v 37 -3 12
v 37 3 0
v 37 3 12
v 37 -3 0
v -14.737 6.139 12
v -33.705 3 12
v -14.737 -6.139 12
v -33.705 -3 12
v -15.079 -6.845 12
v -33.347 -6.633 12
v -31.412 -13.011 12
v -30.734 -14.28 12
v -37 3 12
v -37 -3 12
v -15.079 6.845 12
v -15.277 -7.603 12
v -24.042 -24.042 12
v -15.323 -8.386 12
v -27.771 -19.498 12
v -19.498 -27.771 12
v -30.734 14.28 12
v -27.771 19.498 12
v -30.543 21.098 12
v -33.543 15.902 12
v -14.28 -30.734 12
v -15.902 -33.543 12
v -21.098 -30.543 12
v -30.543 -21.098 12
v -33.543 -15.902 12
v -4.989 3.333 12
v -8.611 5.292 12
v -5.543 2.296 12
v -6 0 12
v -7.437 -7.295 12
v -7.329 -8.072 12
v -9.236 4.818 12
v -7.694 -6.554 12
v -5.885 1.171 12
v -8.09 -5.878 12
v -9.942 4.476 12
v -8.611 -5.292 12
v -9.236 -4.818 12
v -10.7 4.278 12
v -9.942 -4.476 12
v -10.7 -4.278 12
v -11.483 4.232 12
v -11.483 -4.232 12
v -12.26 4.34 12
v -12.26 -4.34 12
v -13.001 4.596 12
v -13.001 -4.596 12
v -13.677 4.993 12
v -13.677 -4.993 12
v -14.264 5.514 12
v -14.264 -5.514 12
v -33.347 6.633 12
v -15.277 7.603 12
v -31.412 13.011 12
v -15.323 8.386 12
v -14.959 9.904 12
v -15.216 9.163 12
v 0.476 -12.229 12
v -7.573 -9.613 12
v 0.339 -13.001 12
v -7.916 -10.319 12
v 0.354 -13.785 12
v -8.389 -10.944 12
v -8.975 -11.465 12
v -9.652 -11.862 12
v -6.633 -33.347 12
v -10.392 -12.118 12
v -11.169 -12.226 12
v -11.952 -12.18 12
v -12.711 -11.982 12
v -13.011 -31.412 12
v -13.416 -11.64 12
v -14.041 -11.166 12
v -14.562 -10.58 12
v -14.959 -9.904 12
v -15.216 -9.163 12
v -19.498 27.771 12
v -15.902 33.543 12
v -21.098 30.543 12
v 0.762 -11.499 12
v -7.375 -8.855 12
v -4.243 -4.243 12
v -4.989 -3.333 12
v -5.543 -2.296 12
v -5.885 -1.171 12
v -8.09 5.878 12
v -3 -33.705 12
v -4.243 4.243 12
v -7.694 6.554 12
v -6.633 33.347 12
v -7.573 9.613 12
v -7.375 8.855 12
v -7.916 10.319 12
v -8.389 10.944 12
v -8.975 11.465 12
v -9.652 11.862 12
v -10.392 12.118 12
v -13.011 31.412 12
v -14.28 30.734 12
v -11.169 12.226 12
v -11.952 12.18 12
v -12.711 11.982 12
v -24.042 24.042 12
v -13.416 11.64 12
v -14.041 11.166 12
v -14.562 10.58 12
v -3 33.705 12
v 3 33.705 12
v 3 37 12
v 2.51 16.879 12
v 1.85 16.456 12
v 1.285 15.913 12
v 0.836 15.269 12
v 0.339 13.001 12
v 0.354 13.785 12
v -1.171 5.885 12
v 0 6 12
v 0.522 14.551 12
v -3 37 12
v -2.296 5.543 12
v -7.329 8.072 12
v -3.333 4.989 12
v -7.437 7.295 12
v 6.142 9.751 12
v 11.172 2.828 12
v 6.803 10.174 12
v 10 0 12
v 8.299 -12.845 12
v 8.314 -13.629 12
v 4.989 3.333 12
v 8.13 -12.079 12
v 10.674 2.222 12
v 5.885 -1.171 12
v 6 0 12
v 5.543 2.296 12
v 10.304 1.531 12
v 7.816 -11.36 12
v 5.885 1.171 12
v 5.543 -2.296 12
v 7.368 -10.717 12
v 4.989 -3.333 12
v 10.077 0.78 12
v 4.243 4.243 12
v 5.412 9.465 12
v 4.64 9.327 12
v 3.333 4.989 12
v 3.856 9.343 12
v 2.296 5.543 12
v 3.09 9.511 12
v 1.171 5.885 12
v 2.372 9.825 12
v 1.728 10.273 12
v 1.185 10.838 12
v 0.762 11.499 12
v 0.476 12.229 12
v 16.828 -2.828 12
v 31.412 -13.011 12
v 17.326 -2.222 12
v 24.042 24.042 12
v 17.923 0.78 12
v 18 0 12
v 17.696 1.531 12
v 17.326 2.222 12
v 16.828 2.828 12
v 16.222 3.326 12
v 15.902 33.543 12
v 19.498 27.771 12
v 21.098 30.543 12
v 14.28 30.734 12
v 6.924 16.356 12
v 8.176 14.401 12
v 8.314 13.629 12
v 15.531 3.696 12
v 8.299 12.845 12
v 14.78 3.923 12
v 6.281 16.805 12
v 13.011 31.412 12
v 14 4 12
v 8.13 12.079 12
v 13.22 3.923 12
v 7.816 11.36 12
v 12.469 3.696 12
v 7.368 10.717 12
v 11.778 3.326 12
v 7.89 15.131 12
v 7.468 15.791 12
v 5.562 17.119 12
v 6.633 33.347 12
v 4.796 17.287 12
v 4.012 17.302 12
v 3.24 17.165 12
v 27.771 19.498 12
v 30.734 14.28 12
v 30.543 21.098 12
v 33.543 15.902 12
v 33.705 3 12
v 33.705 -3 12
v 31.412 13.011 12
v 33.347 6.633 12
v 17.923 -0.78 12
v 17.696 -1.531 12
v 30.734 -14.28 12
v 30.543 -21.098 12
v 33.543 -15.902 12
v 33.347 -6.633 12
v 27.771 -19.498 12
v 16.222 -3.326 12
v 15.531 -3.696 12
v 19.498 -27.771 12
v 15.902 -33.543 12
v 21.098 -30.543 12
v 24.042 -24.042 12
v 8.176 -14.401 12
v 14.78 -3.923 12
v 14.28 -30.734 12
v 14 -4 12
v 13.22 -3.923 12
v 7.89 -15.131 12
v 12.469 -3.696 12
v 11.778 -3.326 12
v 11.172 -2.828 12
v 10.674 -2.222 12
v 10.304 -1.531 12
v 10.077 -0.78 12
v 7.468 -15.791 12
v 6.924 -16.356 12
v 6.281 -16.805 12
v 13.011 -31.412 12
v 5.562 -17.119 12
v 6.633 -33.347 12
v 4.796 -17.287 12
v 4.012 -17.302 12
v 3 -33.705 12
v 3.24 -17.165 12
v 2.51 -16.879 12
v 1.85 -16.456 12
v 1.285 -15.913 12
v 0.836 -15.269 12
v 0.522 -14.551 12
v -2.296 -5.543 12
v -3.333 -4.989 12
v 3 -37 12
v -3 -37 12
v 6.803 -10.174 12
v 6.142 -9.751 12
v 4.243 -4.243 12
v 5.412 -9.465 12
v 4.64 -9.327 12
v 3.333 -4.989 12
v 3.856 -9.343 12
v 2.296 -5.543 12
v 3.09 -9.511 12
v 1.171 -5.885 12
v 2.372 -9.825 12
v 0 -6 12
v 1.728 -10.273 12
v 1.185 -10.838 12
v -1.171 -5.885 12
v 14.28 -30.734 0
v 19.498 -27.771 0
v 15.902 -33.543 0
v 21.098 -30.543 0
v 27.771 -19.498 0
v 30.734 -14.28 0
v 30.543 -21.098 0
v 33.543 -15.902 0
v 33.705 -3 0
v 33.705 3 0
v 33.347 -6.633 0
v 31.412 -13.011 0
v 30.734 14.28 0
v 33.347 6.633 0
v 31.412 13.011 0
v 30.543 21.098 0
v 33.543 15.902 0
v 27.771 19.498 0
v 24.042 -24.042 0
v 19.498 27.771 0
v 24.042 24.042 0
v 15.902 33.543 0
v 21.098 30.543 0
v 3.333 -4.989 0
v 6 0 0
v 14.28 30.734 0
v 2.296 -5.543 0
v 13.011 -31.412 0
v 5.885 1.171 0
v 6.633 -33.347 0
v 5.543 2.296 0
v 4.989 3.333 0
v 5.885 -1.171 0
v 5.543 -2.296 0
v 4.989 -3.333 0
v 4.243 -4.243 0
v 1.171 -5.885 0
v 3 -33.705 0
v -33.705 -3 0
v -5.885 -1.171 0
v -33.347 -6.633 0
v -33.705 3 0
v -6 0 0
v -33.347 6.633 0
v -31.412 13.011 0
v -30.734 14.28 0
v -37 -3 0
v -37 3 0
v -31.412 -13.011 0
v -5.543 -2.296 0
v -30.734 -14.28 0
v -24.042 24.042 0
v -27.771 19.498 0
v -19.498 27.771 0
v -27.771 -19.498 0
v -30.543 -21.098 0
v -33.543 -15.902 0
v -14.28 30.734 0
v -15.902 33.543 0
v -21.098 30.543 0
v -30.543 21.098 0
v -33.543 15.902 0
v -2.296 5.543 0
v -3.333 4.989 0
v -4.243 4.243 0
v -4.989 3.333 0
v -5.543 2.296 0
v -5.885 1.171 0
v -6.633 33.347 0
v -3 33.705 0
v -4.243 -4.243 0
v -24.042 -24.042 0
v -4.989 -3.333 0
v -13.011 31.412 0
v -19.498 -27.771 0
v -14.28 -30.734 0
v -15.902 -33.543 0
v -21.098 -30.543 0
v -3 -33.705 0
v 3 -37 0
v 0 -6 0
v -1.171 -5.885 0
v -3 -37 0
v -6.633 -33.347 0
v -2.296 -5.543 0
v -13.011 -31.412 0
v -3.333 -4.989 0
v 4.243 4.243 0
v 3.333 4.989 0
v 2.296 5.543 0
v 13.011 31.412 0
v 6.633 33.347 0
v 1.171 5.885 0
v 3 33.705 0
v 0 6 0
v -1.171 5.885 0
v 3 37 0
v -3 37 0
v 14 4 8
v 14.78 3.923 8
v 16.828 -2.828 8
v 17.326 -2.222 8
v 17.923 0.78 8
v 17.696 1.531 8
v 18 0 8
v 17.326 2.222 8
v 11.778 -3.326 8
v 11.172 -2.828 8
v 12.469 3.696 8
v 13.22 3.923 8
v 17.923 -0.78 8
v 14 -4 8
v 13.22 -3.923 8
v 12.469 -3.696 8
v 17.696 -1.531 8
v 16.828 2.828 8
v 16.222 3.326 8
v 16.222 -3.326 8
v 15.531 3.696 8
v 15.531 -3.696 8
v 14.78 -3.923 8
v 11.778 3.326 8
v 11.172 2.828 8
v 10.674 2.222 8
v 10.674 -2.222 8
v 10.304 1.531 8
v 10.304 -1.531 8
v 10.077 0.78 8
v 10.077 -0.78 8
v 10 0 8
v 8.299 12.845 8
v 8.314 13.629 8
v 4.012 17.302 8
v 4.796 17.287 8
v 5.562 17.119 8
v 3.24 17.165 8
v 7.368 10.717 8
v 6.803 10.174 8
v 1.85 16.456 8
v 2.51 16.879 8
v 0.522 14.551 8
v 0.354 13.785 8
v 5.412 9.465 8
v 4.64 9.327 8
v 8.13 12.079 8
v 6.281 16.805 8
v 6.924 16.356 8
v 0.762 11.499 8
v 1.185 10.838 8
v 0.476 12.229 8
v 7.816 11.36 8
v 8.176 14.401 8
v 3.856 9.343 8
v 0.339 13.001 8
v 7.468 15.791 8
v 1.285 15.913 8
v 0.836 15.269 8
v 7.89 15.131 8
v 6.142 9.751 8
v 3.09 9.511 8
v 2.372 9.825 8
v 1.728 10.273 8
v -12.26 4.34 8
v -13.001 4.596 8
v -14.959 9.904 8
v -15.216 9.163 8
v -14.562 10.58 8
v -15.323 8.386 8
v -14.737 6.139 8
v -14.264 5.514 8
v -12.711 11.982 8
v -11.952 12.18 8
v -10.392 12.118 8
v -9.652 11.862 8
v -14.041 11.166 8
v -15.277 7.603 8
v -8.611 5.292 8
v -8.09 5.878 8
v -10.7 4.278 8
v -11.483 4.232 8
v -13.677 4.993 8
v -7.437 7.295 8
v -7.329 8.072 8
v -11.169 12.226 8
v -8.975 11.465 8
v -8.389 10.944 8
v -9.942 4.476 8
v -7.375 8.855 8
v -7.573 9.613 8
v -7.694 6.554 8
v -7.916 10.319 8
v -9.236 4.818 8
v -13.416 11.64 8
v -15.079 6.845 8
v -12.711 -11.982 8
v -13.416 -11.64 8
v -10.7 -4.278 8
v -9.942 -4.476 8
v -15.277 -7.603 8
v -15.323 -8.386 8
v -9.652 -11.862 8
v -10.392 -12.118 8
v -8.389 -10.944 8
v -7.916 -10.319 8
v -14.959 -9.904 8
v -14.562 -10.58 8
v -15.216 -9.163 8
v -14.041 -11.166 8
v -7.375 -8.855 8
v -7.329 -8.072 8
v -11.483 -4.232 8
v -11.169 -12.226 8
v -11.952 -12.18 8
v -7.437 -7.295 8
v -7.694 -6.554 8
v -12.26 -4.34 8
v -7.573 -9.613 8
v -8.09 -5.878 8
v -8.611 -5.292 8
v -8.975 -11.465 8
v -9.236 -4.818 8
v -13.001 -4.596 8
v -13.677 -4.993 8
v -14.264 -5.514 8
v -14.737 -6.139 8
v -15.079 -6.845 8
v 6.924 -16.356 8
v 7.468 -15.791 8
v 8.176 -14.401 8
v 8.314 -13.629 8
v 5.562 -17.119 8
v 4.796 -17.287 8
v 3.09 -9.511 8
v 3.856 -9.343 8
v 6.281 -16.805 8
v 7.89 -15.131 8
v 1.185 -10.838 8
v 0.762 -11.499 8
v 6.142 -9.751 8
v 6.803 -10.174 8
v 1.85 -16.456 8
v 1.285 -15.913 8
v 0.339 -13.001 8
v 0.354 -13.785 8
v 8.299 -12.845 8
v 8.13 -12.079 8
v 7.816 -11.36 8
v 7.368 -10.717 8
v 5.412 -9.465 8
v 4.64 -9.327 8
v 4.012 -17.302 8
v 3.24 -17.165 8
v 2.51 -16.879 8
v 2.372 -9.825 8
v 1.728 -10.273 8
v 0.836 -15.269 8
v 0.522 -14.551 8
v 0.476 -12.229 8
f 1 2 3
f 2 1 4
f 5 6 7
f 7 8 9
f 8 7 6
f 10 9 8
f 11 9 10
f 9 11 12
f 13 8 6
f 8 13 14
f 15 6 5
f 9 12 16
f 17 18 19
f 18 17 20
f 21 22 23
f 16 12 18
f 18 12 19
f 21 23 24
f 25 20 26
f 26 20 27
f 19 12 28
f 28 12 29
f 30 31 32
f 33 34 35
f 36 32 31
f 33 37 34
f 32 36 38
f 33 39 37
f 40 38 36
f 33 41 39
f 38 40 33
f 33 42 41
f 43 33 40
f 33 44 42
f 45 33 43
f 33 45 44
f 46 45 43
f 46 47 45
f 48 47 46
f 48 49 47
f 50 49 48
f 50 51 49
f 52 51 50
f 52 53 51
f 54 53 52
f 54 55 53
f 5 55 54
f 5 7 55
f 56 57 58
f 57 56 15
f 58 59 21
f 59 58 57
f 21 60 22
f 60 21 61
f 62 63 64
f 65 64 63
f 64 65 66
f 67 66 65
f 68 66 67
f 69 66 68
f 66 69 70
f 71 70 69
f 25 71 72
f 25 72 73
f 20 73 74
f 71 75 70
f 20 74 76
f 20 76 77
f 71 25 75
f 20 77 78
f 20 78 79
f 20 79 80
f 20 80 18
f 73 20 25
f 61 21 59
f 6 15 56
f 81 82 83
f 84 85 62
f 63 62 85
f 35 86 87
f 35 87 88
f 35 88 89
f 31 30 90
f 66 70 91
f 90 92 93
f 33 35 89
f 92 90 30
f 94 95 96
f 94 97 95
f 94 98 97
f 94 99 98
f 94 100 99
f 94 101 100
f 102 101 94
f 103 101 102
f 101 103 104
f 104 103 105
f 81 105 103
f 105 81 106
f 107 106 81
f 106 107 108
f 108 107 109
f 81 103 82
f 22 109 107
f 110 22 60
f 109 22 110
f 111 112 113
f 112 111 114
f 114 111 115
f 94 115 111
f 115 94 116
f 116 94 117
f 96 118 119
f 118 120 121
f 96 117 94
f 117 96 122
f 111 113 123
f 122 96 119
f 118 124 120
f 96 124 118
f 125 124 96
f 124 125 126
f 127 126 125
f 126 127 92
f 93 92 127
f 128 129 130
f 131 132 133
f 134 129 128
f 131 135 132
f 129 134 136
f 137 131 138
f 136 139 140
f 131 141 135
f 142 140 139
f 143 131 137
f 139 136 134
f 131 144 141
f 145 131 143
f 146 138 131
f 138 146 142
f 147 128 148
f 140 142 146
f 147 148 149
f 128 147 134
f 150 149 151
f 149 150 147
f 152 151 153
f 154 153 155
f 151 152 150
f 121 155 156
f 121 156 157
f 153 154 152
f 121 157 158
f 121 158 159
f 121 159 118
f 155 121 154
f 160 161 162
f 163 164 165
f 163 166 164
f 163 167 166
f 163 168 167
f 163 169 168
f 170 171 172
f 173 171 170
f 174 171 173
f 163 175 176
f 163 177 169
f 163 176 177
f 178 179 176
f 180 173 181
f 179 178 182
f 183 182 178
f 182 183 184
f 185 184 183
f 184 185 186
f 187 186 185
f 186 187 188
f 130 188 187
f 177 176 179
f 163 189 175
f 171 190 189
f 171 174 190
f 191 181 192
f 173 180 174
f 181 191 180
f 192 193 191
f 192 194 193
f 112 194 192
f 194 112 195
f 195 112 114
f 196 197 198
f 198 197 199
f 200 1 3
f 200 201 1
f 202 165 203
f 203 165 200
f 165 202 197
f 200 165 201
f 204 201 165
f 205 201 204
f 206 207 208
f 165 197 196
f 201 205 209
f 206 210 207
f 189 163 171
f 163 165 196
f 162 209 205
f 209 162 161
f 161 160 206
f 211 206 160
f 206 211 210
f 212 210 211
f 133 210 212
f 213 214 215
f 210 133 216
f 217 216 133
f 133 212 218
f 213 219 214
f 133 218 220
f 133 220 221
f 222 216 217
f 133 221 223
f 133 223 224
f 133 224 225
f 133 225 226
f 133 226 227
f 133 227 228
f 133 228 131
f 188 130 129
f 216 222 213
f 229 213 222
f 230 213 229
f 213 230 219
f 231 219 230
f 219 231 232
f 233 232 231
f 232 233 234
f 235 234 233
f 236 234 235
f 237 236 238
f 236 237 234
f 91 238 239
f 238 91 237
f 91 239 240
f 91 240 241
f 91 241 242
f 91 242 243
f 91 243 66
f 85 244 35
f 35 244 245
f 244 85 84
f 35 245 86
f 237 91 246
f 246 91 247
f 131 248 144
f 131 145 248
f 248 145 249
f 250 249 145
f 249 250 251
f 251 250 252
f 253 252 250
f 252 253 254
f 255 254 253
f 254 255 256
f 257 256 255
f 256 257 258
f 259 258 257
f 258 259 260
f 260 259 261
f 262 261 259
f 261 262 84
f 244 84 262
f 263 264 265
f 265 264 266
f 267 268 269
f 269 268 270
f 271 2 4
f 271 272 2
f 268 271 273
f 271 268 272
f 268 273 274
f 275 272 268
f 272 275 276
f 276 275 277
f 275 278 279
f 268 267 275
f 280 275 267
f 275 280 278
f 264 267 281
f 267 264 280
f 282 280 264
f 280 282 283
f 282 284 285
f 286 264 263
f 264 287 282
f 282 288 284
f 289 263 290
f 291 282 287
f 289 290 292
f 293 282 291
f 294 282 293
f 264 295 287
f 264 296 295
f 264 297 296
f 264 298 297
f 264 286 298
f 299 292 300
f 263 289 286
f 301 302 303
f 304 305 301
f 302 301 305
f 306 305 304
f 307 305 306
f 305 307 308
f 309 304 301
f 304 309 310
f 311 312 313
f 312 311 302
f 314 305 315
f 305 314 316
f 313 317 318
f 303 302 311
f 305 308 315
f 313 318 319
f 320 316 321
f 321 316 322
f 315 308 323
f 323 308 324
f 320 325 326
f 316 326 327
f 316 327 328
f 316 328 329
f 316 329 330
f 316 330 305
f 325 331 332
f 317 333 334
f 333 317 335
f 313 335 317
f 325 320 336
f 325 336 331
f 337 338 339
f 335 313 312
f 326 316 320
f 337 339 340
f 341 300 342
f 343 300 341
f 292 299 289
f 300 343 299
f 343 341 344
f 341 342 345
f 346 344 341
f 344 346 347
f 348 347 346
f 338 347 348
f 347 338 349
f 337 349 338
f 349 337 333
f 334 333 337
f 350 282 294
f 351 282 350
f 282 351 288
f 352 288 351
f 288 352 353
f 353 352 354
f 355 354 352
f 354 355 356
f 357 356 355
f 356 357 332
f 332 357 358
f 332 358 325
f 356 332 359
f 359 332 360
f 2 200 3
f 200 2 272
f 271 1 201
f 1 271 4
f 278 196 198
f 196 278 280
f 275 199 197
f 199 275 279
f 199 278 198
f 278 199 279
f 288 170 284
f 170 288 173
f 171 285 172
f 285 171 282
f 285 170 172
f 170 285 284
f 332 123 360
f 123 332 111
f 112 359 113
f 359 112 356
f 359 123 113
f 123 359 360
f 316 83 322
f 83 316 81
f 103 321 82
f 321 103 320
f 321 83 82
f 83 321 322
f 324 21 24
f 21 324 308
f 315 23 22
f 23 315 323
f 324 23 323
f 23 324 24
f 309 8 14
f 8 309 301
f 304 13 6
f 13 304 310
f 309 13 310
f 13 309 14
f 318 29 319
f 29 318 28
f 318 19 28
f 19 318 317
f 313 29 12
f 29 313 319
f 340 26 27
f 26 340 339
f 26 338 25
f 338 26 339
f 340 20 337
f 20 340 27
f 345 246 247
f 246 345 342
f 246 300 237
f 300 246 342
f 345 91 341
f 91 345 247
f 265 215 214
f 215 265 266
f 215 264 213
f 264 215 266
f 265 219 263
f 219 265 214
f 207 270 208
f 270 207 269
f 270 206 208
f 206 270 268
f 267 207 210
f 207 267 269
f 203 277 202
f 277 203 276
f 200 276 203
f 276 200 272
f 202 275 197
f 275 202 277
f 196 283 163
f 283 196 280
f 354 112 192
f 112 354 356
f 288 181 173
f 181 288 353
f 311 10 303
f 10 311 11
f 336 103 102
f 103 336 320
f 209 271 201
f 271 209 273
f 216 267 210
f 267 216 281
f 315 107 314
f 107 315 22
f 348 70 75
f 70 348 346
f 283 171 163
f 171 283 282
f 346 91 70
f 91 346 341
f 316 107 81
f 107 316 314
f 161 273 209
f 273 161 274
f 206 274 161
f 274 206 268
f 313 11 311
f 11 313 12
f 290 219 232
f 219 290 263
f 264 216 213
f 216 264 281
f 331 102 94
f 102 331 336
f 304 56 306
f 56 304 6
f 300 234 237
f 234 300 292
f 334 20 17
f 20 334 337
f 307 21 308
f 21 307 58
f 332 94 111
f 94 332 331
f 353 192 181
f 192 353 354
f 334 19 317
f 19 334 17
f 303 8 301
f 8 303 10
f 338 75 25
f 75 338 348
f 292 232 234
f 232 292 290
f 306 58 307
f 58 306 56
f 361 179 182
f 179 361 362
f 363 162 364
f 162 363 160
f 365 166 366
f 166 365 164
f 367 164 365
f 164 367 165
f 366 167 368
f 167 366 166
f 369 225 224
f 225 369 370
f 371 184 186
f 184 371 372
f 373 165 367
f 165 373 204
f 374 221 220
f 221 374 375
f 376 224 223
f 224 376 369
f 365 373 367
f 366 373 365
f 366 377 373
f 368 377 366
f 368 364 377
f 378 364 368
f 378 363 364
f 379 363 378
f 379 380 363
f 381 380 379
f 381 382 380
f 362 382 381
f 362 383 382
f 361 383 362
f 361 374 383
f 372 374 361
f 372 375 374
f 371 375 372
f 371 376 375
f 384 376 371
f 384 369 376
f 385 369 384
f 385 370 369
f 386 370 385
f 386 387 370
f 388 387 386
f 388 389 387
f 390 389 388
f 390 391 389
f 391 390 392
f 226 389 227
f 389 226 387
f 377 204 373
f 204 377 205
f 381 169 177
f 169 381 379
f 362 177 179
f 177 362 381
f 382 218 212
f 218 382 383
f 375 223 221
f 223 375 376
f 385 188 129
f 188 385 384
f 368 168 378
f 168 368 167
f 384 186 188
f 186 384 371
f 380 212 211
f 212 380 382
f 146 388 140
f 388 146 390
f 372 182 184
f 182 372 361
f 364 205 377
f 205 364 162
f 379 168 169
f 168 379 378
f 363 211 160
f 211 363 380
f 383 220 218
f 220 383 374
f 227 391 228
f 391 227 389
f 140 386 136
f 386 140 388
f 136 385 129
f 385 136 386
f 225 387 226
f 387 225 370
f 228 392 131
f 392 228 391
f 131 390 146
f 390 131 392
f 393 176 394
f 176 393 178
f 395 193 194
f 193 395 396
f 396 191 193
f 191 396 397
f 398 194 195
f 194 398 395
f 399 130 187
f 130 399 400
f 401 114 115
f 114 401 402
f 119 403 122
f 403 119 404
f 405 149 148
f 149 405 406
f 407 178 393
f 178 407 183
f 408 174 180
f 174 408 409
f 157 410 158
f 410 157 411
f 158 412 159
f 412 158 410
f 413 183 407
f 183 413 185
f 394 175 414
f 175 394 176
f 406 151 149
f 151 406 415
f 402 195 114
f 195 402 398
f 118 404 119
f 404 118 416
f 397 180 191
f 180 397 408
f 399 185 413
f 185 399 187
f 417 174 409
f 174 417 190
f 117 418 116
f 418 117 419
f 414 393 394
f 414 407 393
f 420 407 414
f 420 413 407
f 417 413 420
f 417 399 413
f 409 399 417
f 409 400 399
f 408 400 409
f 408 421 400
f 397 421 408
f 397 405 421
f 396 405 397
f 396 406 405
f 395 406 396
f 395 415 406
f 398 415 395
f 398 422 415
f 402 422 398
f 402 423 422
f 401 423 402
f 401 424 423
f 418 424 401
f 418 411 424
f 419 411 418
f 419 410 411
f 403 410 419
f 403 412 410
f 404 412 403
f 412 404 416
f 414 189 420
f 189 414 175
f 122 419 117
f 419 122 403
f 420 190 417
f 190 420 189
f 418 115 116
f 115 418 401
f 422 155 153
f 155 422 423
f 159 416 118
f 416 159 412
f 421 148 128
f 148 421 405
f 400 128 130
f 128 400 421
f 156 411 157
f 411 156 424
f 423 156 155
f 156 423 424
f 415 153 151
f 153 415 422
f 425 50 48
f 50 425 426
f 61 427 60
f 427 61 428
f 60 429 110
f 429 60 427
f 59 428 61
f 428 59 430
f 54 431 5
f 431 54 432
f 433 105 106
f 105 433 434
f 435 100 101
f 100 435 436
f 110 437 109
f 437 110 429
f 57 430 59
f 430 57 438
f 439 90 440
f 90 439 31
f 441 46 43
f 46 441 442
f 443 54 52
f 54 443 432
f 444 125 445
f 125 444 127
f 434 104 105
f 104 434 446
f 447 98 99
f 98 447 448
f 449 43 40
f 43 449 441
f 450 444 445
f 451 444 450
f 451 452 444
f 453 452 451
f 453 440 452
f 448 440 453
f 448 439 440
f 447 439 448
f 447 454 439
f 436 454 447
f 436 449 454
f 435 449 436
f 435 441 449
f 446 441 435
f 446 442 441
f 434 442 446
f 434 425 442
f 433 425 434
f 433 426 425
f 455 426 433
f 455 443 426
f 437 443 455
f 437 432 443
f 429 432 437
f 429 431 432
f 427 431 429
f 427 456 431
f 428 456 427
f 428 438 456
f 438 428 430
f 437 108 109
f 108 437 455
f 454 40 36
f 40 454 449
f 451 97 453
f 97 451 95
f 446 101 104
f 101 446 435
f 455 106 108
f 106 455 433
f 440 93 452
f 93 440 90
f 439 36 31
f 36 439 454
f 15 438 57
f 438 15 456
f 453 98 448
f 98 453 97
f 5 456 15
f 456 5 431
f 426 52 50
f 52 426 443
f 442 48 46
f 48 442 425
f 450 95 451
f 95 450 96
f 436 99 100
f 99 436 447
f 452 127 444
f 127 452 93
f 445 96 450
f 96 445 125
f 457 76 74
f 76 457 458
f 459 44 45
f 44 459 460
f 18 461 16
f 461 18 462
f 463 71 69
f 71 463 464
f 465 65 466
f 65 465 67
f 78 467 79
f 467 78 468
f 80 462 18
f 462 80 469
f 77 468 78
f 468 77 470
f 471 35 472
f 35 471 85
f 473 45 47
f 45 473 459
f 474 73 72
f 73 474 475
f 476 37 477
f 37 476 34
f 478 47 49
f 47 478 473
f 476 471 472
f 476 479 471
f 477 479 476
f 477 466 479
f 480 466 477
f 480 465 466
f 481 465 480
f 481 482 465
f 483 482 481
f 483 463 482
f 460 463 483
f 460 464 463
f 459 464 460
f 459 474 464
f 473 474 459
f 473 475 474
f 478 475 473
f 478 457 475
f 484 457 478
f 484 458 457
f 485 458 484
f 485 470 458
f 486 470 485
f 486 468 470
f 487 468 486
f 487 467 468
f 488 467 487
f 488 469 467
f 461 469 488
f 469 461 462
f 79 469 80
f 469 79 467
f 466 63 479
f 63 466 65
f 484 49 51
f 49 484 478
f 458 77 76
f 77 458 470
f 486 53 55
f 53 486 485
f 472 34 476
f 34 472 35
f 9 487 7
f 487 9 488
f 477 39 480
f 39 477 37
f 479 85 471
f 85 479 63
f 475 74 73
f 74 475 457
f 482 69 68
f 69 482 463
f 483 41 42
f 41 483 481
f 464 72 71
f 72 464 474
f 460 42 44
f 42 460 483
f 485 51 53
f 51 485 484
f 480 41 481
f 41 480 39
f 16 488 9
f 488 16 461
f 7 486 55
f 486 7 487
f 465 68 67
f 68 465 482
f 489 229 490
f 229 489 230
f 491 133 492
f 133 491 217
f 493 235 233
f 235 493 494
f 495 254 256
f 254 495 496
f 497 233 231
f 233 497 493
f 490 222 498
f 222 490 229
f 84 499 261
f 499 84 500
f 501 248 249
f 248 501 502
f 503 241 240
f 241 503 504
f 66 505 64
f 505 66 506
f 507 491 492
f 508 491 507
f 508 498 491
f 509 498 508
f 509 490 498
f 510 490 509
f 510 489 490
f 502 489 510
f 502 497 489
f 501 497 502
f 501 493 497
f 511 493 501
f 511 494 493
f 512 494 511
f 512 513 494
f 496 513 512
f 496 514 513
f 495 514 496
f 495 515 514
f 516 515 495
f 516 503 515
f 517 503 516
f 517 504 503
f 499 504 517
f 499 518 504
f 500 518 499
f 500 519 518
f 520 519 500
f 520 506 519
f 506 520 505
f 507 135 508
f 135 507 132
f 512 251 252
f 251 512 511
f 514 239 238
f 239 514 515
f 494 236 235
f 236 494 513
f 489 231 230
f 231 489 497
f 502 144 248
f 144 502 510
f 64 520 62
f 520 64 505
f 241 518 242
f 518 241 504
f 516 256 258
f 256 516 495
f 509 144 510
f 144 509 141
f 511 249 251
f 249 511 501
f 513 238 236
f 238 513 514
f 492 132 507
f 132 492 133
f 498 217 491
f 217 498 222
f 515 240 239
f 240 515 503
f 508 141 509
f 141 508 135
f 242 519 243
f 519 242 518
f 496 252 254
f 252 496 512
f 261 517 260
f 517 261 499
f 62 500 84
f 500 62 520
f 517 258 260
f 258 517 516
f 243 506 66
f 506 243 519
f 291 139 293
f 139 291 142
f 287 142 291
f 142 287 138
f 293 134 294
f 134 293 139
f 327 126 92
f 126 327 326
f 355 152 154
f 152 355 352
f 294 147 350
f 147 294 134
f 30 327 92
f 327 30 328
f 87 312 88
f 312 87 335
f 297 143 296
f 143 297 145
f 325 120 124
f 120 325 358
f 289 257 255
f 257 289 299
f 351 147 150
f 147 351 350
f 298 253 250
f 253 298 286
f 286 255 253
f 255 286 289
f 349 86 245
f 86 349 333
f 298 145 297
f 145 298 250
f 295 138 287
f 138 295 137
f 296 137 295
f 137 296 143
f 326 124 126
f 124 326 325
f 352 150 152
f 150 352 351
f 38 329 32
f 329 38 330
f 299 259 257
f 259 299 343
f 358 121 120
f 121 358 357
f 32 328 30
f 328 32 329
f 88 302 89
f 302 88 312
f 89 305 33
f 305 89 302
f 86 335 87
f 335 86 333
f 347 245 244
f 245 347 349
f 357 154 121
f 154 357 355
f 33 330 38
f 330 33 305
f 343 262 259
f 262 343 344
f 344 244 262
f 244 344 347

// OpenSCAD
$fn = 32;

// ----------------------------------------------------------------------
// Spur blank: lightened gear blank
// ----------------------------------------------------------------------

// --- parameters (mm) ---
disc_r = 34;              // blank root radius
disc_t = 12;              // blank thickness
n_teeth = 12;             // stub tooth count
tooth_w = 6;              // tooth width at the root
tooth_h = 3;              // tooth height above the root
bore_r = 6;               // central bore radius
ring_r = 14;              // lightening pocket ring radius
pocket_r = 4;             // lightening pocket radius

out_r = disc_r + tooth_h;  // tip radius
bbox_x = 74.0;  // measured width over the teeth
bbox_y = 74.0;  // measured depth over the teeth

difference() {
union() {
  cylinder(r = disc_r, h = disc_t);
  for (i = [0 : n_teeth - 1])
    rotate([0, 0, i * 360 / n_teeth])
      translate([disc_r - 1, -tooth_w / 2, 0])
        cube([tooth_h + 1, tooth_w, disc_t]);
}
  translate([0, 0, -1]) cylinder(r = bore_r, h = disc_t + 2);
  for (i = [0 : 5])
    rotate([0, 0, i * 72])
      translate([ring_r, 0, disc_t - 4])
        cylinder(r = pocket_r, h = 5);
}
